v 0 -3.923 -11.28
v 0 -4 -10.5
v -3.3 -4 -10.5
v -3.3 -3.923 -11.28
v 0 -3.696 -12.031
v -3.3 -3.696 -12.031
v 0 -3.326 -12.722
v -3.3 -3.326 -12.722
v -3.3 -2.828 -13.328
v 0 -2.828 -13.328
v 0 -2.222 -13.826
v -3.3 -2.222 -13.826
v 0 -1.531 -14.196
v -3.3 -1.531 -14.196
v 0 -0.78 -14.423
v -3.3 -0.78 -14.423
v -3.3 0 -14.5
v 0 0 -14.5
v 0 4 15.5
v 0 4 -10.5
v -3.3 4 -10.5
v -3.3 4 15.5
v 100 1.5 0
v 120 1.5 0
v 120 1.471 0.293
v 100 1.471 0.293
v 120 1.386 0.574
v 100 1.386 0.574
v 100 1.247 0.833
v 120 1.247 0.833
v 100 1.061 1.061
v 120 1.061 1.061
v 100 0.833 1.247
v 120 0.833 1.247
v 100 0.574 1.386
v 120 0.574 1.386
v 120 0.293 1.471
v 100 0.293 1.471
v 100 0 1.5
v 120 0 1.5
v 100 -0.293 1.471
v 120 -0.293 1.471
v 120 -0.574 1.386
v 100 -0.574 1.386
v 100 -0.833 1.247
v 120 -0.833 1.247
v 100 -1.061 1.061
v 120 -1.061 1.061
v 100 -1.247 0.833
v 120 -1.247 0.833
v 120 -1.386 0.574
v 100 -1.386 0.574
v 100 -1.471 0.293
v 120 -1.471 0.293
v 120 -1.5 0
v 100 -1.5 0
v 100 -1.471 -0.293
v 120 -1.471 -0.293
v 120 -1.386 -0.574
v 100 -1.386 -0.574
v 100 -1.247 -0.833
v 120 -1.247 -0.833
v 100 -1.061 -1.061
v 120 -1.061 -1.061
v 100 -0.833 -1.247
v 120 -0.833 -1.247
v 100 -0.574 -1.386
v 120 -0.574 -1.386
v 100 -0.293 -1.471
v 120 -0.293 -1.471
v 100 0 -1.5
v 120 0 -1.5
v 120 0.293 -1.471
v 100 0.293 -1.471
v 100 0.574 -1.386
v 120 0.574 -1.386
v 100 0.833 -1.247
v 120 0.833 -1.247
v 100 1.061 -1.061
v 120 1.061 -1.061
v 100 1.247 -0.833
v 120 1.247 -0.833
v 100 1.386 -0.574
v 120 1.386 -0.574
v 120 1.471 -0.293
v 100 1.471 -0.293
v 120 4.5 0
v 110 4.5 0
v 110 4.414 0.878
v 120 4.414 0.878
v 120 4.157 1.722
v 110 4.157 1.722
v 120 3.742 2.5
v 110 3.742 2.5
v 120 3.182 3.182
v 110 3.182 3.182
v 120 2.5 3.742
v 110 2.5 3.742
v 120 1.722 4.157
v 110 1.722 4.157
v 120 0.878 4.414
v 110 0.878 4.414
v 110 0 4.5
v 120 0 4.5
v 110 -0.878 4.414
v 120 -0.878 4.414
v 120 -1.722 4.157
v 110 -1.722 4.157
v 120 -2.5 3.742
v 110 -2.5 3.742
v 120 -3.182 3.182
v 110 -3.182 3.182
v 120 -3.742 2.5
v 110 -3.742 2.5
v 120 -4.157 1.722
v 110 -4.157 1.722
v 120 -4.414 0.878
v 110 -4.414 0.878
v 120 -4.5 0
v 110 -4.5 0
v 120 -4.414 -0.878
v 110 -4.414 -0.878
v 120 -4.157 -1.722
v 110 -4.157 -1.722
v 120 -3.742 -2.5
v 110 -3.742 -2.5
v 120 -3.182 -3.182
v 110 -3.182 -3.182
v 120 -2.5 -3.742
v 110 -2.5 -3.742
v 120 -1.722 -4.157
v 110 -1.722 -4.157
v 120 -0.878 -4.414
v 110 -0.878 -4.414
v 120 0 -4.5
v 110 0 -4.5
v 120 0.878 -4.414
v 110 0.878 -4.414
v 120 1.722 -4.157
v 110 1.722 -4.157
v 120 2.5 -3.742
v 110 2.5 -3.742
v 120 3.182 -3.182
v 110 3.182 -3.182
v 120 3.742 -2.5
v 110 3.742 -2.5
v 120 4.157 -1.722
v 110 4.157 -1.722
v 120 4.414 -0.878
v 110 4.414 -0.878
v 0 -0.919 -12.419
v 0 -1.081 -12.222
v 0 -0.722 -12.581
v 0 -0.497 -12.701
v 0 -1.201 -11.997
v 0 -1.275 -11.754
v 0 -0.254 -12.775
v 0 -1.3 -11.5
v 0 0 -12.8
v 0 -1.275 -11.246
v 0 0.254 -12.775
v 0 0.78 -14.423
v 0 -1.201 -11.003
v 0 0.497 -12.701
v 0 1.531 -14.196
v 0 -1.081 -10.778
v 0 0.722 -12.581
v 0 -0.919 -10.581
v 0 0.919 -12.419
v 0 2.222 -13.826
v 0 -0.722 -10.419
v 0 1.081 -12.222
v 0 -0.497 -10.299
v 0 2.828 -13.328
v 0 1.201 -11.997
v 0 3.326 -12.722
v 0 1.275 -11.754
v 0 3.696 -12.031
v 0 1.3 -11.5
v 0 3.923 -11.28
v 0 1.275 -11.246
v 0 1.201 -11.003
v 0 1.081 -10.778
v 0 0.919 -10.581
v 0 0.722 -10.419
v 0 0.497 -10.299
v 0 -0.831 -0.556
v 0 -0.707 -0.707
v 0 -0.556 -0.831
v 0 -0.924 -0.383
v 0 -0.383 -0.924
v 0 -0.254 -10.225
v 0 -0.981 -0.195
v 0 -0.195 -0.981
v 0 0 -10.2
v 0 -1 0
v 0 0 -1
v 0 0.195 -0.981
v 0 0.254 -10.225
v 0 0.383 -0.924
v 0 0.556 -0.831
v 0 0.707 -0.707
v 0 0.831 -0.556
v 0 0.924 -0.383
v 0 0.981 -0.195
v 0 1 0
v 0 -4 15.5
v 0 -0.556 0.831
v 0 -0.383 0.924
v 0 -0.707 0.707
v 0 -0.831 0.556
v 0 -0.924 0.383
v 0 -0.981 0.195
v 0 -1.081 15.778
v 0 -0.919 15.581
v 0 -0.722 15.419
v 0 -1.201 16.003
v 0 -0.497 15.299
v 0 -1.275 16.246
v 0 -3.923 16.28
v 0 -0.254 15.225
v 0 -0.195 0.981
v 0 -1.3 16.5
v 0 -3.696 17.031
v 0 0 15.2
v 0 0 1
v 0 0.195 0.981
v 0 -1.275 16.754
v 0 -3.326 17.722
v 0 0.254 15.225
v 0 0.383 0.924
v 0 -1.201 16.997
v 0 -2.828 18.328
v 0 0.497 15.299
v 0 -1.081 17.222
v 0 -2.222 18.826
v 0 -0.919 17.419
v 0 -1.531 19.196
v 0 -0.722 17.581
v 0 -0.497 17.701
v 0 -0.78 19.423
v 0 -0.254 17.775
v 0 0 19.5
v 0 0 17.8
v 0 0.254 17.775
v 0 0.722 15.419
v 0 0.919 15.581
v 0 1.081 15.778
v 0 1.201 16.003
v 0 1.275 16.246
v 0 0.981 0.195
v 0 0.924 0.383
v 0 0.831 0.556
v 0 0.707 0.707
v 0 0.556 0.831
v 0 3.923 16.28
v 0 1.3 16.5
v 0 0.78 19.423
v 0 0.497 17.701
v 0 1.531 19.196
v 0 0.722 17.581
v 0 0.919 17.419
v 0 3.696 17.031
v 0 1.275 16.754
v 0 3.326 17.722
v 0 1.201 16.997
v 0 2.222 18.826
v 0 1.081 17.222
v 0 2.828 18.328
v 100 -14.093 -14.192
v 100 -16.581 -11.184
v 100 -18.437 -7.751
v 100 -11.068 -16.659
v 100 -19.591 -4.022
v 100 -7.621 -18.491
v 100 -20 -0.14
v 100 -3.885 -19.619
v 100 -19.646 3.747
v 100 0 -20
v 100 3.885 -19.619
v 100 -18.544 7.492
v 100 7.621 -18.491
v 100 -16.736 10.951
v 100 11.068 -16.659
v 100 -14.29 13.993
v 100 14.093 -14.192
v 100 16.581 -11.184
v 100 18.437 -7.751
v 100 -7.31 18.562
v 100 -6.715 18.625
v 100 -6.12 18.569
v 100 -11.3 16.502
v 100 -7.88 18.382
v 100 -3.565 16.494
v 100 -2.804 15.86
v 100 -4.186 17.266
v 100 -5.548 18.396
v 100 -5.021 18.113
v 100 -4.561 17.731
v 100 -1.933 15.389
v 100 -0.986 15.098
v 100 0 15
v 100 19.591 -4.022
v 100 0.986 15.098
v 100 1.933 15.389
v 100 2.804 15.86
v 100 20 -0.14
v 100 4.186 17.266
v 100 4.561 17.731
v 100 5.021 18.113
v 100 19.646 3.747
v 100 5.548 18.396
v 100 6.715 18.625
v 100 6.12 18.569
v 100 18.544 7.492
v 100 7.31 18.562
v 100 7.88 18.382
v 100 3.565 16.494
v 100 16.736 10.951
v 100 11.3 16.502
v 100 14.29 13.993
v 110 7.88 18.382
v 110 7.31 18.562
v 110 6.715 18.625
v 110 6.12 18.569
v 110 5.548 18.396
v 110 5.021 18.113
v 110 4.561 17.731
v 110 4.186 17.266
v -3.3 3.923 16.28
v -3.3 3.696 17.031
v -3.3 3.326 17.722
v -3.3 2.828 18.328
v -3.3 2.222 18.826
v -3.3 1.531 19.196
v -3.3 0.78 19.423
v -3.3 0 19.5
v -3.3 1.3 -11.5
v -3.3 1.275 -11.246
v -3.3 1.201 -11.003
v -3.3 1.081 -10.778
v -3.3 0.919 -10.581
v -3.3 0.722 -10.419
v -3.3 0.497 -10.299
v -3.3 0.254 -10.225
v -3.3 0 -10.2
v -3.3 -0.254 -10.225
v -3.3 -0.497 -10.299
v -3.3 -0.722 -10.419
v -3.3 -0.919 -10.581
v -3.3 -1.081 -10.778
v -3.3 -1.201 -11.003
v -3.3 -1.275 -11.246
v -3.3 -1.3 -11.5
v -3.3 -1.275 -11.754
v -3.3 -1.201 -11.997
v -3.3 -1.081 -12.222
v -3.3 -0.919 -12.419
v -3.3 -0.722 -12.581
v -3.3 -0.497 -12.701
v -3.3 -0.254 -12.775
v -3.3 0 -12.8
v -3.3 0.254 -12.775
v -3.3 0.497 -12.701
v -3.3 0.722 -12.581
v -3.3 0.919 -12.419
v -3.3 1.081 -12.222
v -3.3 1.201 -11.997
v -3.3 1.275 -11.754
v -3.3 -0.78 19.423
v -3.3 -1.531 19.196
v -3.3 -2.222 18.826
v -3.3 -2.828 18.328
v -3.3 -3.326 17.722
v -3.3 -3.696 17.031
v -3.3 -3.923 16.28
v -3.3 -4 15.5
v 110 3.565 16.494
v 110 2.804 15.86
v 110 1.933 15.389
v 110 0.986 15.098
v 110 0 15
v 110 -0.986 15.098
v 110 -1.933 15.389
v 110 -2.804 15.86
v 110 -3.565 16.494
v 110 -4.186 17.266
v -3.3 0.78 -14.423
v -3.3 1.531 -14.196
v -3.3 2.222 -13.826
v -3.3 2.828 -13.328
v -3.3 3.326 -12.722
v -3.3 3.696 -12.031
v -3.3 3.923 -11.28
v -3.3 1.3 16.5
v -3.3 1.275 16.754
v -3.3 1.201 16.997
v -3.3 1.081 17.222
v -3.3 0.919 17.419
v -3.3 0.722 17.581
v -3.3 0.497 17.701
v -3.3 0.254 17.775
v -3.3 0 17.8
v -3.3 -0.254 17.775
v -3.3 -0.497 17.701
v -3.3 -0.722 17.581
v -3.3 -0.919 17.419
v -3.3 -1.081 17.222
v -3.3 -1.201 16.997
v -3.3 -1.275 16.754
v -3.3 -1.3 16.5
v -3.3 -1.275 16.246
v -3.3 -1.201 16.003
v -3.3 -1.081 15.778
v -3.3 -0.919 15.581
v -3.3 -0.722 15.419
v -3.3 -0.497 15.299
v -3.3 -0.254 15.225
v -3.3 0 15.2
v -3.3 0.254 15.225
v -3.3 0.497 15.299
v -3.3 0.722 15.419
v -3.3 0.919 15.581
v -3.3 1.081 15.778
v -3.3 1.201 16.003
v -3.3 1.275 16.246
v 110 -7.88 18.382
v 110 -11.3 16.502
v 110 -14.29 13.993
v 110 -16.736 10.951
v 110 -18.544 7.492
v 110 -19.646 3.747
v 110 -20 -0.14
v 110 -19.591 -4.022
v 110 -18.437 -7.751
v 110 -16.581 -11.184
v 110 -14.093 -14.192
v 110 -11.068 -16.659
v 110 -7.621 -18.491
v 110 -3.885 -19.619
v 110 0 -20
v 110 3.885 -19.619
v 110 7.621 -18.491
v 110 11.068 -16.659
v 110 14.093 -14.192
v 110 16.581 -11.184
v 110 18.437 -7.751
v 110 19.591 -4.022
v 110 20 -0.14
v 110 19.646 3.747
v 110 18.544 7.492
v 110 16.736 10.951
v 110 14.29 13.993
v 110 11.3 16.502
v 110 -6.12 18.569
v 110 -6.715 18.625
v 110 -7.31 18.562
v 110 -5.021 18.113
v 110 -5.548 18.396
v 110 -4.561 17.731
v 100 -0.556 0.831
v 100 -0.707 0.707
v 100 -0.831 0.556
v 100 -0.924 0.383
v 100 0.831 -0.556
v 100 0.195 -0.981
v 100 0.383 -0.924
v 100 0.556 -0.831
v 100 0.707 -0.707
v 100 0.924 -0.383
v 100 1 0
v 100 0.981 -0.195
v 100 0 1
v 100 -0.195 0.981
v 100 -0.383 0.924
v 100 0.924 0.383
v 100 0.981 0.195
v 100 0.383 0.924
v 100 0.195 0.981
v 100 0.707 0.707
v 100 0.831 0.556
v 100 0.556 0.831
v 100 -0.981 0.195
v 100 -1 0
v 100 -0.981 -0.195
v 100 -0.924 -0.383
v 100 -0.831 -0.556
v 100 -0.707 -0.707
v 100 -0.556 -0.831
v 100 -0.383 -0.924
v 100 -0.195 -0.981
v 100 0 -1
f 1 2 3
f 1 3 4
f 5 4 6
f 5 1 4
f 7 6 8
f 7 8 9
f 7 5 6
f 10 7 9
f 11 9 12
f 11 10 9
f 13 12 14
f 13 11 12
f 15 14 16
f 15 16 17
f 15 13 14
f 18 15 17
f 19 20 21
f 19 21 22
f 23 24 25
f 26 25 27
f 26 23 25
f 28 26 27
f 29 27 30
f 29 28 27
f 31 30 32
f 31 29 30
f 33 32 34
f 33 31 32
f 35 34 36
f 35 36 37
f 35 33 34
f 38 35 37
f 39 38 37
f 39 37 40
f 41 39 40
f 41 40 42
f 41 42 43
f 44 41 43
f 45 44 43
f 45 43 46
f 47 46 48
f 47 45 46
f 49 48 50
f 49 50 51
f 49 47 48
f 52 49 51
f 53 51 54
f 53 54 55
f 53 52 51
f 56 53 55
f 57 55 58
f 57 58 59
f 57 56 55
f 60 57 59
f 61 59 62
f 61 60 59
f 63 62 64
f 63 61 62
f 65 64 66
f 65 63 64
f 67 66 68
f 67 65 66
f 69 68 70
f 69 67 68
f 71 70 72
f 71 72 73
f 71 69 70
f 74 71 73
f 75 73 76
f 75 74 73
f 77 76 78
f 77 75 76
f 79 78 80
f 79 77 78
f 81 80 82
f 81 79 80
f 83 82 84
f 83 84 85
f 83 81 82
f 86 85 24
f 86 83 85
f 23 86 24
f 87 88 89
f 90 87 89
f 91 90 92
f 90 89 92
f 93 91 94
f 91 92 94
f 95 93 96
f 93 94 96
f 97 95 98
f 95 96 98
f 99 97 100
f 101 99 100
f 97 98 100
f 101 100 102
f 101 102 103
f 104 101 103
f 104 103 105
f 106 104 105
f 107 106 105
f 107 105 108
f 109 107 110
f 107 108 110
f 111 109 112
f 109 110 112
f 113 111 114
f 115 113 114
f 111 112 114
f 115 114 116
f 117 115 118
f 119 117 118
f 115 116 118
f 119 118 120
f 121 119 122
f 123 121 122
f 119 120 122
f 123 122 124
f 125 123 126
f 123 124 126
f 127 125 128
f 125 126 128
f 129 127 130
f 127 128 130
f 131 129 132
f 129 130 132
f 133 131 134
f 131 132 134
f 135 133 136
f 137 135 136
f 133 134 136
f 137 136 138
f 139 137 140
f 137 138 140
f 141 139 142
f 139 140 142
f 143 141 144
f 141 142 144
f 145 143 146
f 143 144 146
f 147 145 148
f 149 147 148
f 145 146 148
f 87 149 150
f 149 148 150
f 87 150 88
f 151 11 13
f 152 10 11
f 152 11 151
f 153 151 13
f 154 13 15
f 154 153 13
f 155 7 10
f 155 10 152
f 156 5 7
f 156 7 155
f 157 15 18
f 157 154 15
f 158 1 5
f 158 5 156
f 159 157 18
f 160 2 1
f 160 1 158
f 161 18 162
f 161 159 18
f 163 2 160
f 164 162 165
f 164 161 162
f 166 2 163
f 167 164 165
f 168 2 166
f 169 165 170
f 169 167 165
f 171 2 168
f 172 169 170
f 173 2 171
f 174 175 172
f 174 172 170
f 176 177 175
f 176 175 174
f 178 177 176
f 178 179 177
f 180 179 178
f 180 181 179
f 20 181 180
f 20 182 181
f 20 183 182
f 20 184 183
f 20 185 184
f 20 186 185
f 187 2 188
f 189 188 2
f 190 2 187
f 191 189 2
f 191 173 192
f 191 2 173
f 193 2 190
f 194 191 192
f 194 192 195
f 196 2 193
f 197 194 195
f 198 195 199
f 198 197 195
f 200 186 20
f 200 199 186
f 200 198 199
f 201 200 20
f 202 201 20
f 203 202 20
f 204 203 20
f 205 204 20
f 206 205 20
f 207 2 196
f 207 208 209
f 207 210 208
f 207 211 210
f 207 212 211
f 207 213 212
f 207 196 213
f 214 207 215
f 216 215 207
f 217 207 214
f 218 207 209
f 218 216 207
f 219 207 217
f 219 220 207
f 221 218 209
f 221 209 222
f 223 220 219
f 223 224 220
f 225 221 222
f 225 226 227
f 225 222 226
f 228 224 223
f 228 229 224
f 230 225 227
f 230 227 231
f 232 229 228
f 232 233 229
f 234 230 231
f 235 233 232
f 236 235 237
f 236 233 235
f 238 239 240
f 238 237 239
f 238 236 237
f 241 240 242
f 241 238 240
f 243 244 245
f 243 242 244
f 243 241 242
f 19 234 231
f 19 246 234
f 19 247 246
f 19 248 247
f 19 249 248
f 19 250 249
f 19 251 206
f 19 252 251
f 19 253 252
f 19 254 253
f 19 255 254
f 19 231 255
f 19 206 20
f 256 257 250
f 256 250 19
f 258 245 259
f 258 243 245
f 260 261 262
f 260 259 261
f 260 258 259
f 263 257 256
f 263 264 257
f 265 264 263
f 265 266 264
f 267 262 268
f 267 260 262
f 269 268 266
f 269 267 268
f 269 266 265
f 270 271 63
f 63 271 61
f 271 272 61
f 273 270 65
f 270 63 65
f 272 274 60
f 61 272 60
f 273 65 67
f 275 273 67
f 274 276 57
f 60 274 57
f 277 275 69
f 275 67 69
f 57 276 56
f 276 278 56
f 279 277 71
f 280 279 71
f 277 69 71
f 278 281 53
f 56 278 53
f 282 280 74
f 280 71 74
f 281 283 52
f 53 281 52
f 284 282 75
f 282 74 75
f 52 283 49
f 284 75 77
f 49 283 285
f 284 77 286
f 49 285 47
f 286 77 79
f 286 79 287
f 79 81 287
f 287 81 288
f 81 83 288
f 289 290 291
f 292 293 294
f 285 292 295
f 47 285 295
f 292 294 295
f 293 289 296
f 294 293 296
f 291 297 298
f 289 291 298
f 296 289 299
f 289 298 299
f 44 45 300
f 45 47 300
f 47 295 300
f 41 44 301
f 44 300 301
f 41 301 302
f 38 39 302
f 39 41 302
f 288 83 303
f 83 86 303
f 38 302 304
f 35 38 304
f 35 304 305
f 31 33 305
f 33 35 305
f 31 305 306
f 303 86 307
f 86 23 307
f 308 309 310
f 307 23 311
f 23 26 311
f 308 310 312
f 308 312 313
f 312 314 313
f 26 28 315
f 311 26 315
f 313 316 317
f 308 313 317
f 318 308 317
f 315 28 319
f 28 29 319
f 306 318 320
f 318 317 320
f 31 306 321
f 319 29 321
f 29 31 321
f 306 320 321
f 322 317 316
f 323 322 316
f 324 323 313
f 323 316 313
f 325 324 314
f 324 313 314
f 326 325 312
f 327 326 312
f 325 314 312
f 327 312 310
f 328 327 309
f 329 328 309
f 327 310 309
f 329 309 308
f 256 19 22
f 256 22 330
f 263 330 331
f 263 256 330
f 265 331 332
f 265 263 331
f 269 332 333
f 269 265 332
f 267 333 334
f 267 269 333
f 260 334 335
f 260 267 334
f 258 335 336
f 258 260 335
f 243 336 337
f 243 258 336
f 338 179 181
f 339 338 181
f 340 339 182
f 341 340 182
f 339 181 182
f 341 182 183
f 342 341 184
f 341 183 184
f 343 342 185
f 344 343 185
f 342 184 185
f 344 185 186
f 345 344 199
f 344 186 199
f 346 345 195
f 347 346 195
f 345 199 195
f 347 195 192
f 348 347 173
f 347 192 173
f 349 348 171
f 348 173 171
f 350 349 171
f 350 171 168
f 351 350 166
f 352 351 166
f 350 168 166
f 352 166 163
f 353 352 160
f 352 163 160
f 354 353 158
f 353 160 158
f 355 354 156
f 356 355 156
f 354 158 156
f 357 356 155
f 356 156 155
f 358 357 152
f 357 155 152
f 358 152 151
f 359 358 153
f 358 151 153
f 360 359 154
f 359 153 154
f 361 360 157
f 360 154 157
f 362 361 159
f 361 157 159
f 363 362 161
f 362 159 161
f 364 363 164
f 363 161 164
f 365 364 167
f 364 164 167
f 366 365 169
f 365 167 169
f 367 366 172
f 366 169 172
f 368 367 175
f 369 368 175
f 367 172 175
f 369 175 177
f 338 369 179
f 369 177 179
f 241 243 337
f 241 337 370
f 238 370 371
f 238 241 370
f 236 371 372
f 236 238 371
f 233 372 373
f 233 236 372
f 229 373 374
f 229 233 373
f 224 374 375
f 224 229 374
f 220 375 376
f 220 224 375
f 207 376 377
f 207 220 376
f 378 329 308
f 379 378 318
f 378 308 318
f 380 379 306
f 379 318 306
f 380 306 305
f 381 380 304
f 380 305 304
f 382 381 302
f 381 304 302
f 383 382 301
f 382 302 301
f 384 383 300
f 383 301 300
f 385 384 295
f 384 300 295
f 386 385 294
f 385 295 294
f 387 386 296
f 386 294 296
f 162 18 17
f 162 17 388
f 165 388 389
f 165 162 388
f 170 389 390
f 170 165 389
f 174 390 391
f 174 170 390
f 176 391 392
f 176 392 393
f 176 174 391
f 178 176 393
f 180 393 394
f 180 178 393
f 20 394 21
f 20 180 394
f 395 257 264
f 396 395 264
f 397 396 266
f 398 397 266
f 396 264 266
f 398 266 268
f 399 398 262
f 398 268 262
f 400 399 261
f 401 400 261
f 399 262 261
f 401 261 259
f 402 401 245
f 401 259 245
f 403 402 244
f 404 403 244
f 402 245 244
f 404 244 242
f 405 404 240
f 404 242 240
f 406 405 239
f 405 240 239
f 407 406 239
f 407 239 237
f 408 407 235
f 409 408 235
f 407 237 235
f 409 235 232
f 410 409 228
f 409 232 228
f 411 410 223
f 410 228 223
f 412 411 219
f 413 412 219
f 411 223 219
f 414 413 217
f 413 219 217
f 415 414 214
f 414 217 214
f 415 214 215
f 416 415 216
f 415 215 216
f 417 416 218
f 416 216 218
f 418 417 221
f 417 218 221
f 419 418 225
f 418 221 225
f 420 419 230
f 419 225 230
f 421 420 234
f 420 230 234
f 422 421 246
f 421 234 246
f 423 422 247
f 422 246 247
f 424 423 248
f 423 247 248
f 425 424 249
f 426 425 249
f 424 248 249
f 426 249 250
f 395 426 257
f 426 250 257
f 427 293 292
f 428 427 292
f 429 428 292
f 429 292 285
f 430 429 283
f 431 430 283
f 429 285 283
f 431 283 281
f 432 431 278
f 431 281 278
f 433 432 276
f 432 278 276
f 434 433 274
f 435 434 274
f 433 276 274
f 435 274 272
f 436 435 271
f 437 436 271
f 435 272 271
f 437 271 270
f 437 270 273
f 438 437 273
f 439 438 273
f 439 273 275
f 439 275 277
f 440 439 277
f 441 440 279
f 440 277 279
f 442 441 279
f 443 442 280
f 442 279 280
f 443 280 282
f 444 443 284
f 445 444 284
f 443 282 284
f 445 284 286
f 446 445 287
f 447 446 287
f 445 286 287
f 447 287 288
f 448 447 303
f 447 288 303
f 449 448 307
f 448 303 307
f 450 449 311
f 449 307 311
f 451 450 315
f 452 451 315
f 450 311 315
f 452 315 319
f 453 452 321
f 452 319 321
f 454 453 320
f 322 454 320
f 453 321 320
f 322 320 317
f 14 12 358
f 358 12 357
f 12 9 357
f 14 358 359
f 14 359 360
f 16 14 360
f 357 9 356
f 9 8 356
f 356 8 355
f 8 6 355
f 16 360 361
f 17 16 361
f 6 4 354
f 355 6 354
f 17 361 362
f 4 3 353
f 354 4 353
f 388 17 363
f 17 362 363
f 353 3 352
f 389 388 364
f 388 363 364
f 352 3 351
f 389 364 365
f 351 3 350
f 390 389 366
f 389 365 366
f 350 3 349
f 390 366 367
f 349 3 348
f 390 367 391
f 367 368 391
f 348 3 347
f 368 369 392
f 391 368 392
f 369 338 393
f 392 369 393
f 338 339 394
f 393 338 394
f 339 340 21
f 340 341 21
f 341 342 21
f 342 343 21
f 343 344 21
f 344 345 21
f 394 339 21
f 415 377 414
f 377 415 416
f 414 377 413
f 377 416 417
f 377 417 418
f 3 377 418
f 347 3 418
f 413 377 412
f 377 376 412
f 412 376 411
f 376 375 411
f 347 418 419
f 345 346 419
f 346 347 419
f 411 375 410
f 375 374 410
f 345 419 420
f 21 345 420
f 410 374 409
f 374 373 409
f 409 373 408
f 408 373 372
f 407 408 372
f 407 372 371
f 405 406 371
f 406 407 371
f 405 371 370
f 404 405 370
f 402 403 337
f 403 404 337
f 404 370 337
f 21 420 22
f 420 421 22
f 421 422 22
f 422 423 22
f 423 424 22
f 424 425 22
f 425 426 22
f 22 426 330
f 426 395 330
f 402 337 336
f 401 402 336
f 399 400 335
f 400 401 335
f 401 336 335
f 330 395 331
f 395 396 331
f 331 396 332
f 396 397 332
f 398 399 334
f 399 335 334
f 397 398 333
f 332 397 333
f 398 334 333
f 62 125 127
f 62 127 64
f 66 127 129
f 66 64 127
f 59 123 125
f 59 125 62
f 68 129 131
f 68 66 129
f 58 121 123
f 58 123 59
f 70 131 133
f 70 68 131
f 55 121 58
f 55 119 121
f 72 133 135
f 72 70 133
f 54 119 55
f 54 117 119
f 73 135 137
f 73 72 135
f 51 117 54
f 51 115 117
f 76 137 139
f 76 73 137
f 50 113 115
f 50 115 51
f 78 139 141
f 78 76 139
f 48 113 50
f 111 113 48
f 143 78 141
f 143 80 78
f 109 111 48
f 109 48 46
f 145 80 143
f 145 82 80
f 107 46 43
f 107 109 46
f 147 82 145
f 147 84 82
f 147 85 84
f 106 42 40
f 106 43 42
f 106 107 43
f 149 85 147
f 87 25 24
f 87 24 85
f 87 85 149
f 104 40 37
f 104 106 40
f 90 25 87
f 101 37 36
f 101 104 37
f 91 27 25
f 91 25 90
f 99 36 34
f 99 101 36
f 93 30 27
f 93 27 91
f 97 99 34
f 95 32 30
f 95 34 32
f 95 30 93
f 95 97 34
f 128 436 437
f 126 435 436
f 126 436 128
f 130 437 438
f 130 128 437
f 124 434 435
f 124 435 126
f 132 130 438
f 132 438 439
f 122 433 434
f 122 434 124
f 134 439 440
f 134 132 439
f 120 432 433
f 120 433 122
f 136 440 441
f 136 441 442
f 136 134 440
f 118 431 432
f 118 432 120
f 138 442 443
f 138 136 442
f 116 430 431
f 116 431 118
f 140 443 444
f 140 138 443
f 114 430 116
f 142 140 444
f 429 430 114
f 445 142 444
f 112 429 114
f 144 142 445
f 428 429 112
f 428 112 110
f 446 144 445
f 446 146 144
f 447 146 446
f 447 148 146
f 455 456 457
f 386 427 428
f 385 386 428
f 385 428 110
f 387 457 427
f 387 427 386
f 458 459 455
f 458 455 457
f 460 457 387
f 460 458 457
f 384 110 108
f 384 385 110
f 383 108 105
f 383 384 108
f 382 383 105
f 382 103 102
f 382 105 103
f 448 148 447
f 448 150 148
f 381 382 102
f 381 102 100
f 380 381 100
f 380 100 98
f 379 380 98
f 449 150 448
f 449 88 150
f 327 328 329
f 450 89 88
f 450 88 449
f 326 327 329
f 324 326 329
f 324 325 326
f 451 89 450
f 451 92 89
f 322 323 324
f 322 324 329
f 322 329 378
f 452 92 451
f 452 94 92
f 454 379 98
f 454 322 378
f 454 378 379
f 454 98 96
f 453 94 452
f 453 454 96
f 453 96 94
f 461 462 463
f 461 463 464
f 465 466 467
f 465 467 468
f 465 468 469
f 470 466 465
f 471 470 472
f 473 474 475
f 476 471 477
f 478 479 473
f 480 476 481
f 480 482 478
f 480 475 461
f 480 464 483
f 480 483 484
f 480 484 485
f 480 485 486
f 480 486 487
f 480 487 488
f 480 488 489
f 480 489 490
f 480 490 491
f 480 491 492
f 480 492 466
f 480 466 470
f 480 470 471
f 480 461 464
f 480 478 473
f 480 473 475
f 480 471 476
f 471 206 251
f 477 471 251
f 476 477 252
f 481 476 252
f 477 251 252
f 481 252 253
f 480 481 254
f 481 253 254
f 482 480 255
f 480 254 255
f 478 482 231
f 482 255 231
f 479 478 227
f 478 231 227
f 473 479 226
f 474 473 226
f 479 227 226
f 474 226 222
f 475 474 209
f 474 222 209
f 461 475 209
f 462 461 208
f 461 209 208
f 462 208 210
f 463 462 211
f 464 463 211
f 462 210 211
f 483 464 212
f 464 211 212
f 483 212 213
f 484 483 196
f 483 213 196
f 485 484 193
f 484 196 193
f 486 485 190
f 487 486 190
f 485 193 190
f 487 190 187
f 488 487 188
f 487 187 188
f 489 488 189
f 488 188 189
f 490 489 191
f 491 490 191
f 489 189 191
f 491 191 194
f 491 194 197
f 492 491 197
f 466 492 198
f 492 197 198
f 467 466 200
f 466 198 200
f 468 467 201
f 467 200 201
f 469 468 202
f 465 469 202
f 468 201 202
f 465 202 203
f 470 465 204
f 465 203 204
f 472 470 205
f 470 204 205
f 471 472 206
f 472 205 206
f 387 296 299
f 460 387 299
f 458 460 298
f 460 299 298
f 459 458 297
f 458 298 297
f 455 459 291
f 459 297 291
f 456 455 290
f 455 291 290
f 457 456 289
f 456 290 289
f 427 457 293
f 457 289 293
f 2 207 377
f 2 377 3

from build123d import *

# Parameters (mm, degrees)
F0_R     = 1
F1_DEPTH = 100
F2_R     = 1.3
F3_DEPTH = 3.3
F4_R     = 1.5
F5_DEPTH = 10
F6_R     = 4.5
F6_R_2   = 1.5
F7_DEPTH = 10


with BuildPart() as f1:
    # F0 (on Right) → F1 (new body)
    with BuildSketch(Plane.YZ):
        Circle(F0_R)
    extrude(amount=F1_DEPTH)

    # F2 (on Right) → F3 (join)
    with BuildSketch(Plane.YZ):
        with BuildLine():
            ThreePointArc((0, -14.5), (2.828427, -13.328427), (4, -10.5))
            Line((4, -10.5), (4, 15.5))
            ThreePointArc((4, 15.5), (2.828427, 18.328427), (0, 19.5))
            ThreePointArc((0, 19.5), (-2.828427, 18.328427), (-4, 15.5))
            Line((-4, 15.5), (-4, -10.5))
            ThreePointArc((-4, -10.5), (-2.828427, -13.328427), (0, -14.5))
        make_face()
        with Locations((0, -11.5)):
            Circle(F2_R, mode=Mode.SUBTRACT)
        with Locations((0, 16.5)):
            Circle(F2_R, mode=Mode.SUBTRACT)
    extrude(amount=-F3_DEPTH)


with BuildPart() as f5:
    # F4 (on face) → F5 (new body)
    with BuildSketch(Plane.YZ.offset(100)):
        with BuildLine():
            ThreePointArc((-4.186071, 17.265625), (-5.829503, 18.496621), (-7.879664, 18.382353))
            ThreePointArc((-7.879664, 18.382353), (0, -20), (7.879664, 18.382353))
            ThreePointArc((7.879664, 18.382353), (5.829503, 18.496621), (4.186071, 17.265625))
            ThreePointArc((4.186071, 17.265625), (0, 15), (-4.186071, 17.265625))
        make_face()
        Circle(F4_R, mode=Mode.SUBTRACT)
    extrude(amount=F5_DEPTH)

    # F6 (on face) → F7 (join)
    with BuildSketch(Plane.YZ.offset(110)):
        Circle(F6_R)
        Circle(F6_R_2, mode=Mode.SUBTRACT)
    extrude(amount=F7_DEPTH)


solid = Compound([f1.part, f5.part])
